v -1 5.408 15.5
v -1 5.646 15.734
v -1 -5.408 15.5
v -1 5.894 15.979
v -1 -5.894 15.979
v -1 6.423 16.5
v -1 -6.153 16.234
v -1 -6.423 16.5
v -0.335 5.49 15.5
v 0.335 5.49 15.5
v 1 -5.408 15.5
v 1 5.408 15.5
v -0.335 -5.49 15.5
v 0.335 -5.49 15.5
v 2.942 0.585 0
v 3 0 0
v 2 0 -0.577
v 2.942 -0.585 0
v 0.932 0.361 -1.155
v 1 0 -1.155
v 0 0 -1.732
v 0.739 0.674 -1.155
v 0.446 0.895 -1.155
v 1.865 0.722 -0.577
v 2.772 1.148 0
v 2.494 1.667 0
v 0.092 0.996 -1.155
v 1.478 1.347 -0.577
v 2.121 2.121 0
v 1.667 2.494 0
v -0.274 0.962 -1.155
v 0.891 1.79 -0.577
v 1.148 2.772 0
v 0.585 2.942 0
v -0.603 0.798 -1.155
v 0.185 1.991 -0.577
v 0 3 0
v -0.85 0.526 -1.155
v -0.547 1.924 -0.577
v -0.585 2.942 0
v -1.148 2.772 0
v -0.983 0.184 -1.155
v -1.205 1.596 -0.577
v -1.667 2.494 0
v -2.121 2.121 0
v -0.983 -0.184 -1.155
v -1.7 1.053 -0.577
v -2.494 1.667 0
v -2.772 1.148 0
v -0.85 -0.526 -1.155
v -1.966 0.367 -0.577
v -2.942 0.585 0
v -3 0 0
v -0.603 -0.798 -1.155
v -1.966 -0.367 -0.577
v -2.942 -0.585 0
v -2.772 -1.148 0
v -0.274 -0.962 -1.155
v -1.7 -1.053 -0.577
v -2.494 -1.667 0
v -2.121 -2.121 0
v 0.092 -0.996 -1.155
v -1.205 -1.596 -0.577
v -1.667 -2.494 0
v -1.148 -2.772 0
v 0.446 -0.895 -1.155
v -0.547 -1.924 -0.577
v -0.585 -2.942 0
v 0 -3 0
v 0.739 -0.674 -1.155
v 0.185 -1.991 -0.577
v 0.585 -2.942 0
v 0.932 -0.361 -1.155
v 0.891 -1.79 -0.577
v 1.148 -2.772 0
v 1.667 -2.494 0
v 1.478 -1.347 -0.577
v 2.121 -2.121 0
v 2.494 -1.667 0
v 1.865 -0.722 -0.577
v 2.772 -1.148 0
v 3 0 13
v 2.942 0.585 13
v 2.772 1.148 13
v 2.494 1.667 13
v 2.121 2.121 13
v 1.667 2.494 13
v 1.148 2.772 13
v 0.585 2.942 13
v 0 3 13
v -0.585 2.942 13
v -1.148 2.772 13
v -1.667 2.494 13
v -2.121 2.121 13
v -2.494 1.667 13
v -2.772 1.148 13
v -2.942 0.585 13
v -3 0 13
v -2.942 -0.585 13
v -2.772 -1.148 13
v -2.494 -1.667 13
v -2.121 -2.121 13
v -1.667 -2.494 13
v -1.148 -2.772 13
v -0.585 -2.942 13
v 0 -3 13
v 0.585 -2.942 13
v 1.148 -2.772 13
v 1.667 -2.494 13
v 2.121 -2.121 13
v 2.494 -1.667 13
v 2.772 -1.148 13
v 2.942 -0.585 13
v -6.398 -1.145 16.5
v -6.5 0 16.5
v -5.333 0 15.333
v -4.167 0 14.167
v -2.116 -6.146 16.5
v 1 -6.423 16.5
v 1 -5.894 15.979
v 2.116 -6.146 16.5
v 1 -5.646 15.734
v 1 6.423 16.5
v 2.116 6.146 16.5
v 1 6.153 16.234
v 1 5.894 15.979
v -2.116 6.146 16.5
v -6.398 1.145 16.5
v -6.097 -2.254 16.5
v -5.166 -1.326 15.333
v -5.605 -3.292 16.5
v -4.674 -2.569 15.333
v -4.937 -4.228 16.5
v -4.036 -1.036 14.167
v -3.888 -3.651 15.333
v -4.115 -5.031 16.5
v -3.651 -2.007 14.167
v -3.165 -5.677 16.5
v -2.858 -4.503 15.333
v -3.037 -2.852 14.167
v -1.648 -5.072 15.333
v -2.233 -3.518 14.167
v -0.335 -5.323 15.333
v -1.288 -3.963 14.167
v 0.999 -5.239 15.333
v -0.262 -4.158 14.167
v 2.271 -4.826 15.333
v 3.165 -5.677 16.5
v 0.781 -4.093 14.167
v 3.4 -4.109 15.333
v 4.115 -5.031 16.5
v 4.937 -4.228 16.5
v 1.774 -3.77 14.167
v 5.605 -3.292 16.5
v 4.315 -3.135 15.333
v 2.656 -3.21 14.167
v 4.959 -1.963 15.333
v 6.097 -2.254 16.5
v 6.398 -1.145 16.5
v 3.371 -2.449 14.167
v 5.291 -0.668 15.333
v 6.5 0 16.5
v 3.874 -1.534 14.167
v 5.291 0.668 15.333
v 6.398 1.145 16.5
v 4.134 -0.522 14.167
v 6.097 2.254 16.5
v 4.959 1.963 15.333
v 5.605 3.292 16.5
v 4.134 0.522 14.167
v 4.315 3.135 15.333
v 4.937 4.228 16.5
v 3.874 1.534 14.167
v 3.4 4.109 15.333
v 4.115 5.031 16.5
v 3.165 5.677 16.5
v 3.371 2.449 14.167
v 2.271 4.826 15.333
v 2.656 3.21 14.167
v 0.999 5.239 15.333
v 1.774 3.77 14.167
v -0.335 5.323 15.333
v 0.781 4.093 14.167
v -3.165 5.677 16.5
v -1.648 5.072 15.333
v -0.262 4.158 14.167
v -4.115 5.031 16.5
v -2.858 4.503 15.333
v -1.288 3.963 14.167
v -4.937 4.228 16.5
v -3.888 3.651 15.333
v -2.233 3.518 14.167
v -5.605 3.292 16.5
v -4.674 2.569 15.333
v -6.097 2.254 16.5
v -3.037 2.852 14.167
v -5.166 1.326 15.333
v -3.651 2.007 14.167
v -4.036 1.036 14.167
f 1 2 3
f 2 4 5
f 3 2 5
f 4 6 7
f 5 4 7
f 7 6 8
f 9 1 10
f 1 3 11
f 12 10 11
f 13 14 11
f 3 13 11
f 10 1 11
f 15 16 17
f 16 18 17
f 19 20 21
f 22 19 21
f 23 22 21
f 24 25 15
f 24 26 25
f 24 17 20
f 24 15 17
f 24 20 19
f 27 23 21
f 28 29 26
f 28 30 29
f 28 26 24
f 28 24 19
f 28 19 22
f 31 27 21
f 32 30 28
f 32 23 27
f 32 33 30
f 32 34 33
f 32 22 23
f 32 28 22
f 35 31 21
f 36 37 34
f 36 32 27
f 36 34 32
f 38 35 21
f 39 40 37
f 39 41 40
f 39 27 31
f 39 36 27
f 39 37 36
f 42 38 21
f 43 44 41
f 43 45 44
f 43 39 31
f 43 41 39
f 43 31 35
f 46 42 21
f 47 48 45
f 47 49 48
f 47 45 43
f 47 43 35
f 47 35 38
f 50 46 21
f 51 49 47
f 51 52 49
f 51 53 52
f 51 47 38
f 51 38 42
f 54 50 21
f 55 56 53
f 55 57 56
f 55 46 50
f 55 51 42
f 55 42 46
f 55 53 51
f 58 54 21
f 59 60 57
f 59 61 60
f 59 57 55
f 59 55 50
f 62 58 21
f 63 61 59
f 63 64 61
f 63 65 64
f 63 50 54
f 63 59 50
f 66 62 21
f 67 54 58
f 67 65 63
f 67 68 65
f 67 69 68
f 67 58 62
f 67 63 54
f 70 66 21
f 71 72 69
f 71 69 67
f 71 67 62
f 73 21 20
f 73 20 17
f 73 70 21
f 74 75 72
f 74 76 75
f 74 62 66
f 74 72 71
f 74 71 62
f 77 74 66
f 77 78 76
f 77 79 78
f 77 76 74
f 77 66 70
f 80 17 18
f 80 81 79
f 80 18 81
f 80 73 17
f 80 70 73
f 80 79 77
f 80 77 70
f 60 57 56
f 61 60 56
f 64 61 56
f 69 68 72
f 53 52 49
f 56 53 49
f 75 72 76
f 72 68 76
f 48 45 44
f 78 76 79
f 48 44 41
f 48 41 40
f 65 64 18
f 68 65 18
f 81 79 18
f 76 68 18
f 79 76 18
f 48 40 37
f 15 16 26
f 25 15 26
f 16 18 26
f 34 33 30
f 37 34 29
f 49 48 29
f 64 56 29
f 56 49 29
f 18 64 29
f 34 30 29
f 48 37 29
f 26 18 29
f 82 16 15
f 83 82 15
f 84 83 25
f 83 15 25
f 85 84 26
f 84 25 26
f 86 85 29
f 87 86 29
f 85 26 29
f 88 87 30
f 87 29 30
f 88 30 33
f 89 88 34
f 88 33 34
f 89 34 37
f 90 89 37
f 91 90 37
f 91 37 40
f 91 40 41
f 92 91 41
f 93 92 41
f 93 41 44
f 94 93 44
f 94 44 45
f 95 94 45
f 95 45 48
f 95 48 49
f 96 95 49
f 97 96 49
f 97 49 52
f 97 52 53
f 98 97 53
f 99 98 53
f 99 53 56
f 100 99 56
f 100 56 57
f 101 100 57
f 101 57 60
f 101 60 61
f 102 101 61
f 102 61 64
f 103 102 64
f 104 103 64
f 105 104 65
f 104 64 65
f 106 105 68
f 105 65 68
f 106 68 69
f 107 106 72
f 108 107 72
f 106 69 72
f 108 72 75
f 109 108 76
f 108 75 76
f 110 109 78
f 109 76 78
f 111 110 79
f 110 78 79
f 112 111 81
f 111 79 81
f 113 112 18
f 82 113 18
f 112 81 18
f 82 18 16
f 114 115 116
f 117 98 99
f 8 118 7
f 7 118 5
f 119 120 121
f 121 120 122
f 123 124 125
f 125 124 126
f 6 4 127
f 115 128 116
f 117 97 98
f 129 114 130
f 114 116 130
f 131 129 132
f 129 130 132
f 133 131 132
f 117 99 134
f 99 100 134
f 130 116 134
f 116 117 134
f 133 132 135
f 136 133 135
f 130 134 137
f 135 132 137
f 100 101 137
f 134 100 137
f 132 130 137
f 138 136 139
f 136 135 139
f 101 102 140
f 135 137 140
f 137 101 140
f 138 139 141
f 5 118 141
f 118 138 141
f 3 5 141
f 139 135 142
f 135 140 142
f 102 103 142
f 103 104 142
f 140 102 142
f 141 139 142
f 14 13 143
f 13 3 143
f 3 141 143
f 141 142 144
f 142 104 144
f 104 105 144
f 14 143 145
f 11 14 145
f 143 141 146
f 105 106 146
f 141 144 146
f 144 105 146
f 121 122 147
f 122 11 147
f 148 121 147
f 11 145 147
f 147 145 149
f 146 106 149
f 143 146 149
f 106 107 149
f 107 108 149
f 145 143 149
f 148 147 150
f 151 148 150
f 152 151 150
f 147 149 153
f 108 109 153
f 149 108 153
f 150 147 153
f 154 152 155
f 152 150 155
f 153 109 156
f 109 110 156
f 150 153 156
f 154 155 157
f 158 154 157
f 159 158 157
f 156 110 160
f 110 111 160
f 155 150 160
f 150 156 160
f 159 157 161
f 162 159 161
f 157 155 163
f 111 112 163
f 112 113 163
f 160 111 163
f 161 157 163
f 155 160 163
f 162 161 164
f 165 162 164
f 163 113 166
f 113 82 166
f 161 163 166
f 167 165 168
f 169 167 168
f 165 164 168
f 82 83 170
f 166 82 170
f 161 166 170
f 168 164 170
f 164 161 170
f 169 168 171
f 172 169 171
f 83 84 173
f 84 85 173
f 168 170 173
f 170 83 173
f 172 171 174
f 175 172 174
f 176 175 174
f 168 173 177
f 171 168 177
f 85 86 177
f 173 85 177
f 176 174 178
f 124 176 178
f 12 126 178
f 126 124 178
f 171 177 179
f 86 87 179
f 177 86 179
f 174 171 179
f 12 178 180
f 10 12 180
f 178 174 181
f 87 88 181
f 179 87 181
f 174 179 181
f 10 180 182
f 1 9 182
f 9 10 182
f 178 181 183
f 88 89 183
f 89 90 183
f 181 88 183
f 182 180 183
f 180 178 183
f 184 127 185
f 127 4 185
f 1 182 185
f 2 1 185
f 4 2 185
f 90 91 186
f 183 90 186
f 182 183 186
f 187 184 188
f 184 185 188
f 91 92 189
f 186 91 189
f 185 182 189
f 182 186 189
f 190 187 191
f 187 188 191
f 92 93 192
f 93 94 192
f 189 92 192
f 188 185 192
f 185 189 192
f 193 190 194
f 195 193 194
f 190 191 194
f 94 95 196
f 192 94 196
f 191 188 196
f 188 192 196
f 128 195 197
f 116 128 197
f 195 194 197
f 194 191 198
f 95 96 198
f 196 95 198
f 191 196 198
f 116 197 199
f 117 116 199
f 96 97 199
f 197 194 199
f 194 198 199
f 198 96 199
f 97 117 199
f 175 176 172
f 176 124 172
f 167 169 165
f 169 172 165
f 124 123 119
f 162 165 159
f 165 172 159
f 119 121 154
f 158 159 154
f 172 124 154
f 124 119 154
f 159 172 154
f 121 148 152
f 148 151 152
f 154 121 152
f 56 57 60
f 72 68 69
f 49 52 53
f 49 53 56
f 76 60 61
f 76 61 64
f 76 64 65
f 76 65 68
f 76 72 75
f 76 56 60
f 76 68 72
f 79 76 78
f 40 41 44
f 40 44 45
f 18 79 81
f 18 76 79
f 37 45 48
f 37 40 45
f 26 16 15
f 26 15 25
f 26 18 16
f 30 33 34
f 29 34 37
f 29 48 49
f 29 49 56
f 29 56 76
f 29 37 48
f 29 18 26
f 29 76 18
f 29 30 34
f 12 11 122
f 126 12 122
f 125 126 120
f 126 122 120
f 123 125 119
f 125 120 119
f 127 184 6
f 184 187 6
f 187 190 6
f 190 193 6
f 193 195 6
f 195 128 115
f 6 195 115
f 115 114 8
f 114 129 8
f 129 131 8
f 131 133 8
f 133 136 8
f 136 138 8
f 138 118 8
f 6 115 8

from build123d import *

# Parameters (mm, degrees)
F0_R     = 3
F1_DEPTH = 13
F7_DEPTH = 12.5


with BuildPart() as f1:
    # F0 (on Top) → F1 (new body)
    with BuildSketch(Plane.XY):
        Circle(F0_R)
    extrude(amount=F1_DEPTH)

    # F4 (on Front) → F5 (revolve)
    with BuildSketch(Plane.XZ):
        Polygon((-3, 13), (0, 13), (0, 15.5), (0, 16.5), (-1, 16.5), (-6.5, 16.5), align=None)
    revolve(axis=Axis((0, 0, 14.25), (0, 0, 1)))

    # F6 (on Front) → F7 (cut, symmetric)
    with BuildSketch(Plane.XZ):
        Polygon((-1, 15.5), (0, 15.5), (1, 15.5), (1, 16.5), (-1, 16.5), align=None)
    extrude(amount=F7_DEPTH, both=True, mode=Mode.SUBTRACT)


with BuildPart() as f3:
    # F2 (on Front) → F3 (revolve)
    with BuildSketch(Plane.XZ):
        Polygon((3, 0), (0, 0), (0, -1.732051), align=None)
    revolve(axis=Axis((0, 0, -0.866025), (0, 0, 1)))


solid = Compound([f1.part, f3.part])
